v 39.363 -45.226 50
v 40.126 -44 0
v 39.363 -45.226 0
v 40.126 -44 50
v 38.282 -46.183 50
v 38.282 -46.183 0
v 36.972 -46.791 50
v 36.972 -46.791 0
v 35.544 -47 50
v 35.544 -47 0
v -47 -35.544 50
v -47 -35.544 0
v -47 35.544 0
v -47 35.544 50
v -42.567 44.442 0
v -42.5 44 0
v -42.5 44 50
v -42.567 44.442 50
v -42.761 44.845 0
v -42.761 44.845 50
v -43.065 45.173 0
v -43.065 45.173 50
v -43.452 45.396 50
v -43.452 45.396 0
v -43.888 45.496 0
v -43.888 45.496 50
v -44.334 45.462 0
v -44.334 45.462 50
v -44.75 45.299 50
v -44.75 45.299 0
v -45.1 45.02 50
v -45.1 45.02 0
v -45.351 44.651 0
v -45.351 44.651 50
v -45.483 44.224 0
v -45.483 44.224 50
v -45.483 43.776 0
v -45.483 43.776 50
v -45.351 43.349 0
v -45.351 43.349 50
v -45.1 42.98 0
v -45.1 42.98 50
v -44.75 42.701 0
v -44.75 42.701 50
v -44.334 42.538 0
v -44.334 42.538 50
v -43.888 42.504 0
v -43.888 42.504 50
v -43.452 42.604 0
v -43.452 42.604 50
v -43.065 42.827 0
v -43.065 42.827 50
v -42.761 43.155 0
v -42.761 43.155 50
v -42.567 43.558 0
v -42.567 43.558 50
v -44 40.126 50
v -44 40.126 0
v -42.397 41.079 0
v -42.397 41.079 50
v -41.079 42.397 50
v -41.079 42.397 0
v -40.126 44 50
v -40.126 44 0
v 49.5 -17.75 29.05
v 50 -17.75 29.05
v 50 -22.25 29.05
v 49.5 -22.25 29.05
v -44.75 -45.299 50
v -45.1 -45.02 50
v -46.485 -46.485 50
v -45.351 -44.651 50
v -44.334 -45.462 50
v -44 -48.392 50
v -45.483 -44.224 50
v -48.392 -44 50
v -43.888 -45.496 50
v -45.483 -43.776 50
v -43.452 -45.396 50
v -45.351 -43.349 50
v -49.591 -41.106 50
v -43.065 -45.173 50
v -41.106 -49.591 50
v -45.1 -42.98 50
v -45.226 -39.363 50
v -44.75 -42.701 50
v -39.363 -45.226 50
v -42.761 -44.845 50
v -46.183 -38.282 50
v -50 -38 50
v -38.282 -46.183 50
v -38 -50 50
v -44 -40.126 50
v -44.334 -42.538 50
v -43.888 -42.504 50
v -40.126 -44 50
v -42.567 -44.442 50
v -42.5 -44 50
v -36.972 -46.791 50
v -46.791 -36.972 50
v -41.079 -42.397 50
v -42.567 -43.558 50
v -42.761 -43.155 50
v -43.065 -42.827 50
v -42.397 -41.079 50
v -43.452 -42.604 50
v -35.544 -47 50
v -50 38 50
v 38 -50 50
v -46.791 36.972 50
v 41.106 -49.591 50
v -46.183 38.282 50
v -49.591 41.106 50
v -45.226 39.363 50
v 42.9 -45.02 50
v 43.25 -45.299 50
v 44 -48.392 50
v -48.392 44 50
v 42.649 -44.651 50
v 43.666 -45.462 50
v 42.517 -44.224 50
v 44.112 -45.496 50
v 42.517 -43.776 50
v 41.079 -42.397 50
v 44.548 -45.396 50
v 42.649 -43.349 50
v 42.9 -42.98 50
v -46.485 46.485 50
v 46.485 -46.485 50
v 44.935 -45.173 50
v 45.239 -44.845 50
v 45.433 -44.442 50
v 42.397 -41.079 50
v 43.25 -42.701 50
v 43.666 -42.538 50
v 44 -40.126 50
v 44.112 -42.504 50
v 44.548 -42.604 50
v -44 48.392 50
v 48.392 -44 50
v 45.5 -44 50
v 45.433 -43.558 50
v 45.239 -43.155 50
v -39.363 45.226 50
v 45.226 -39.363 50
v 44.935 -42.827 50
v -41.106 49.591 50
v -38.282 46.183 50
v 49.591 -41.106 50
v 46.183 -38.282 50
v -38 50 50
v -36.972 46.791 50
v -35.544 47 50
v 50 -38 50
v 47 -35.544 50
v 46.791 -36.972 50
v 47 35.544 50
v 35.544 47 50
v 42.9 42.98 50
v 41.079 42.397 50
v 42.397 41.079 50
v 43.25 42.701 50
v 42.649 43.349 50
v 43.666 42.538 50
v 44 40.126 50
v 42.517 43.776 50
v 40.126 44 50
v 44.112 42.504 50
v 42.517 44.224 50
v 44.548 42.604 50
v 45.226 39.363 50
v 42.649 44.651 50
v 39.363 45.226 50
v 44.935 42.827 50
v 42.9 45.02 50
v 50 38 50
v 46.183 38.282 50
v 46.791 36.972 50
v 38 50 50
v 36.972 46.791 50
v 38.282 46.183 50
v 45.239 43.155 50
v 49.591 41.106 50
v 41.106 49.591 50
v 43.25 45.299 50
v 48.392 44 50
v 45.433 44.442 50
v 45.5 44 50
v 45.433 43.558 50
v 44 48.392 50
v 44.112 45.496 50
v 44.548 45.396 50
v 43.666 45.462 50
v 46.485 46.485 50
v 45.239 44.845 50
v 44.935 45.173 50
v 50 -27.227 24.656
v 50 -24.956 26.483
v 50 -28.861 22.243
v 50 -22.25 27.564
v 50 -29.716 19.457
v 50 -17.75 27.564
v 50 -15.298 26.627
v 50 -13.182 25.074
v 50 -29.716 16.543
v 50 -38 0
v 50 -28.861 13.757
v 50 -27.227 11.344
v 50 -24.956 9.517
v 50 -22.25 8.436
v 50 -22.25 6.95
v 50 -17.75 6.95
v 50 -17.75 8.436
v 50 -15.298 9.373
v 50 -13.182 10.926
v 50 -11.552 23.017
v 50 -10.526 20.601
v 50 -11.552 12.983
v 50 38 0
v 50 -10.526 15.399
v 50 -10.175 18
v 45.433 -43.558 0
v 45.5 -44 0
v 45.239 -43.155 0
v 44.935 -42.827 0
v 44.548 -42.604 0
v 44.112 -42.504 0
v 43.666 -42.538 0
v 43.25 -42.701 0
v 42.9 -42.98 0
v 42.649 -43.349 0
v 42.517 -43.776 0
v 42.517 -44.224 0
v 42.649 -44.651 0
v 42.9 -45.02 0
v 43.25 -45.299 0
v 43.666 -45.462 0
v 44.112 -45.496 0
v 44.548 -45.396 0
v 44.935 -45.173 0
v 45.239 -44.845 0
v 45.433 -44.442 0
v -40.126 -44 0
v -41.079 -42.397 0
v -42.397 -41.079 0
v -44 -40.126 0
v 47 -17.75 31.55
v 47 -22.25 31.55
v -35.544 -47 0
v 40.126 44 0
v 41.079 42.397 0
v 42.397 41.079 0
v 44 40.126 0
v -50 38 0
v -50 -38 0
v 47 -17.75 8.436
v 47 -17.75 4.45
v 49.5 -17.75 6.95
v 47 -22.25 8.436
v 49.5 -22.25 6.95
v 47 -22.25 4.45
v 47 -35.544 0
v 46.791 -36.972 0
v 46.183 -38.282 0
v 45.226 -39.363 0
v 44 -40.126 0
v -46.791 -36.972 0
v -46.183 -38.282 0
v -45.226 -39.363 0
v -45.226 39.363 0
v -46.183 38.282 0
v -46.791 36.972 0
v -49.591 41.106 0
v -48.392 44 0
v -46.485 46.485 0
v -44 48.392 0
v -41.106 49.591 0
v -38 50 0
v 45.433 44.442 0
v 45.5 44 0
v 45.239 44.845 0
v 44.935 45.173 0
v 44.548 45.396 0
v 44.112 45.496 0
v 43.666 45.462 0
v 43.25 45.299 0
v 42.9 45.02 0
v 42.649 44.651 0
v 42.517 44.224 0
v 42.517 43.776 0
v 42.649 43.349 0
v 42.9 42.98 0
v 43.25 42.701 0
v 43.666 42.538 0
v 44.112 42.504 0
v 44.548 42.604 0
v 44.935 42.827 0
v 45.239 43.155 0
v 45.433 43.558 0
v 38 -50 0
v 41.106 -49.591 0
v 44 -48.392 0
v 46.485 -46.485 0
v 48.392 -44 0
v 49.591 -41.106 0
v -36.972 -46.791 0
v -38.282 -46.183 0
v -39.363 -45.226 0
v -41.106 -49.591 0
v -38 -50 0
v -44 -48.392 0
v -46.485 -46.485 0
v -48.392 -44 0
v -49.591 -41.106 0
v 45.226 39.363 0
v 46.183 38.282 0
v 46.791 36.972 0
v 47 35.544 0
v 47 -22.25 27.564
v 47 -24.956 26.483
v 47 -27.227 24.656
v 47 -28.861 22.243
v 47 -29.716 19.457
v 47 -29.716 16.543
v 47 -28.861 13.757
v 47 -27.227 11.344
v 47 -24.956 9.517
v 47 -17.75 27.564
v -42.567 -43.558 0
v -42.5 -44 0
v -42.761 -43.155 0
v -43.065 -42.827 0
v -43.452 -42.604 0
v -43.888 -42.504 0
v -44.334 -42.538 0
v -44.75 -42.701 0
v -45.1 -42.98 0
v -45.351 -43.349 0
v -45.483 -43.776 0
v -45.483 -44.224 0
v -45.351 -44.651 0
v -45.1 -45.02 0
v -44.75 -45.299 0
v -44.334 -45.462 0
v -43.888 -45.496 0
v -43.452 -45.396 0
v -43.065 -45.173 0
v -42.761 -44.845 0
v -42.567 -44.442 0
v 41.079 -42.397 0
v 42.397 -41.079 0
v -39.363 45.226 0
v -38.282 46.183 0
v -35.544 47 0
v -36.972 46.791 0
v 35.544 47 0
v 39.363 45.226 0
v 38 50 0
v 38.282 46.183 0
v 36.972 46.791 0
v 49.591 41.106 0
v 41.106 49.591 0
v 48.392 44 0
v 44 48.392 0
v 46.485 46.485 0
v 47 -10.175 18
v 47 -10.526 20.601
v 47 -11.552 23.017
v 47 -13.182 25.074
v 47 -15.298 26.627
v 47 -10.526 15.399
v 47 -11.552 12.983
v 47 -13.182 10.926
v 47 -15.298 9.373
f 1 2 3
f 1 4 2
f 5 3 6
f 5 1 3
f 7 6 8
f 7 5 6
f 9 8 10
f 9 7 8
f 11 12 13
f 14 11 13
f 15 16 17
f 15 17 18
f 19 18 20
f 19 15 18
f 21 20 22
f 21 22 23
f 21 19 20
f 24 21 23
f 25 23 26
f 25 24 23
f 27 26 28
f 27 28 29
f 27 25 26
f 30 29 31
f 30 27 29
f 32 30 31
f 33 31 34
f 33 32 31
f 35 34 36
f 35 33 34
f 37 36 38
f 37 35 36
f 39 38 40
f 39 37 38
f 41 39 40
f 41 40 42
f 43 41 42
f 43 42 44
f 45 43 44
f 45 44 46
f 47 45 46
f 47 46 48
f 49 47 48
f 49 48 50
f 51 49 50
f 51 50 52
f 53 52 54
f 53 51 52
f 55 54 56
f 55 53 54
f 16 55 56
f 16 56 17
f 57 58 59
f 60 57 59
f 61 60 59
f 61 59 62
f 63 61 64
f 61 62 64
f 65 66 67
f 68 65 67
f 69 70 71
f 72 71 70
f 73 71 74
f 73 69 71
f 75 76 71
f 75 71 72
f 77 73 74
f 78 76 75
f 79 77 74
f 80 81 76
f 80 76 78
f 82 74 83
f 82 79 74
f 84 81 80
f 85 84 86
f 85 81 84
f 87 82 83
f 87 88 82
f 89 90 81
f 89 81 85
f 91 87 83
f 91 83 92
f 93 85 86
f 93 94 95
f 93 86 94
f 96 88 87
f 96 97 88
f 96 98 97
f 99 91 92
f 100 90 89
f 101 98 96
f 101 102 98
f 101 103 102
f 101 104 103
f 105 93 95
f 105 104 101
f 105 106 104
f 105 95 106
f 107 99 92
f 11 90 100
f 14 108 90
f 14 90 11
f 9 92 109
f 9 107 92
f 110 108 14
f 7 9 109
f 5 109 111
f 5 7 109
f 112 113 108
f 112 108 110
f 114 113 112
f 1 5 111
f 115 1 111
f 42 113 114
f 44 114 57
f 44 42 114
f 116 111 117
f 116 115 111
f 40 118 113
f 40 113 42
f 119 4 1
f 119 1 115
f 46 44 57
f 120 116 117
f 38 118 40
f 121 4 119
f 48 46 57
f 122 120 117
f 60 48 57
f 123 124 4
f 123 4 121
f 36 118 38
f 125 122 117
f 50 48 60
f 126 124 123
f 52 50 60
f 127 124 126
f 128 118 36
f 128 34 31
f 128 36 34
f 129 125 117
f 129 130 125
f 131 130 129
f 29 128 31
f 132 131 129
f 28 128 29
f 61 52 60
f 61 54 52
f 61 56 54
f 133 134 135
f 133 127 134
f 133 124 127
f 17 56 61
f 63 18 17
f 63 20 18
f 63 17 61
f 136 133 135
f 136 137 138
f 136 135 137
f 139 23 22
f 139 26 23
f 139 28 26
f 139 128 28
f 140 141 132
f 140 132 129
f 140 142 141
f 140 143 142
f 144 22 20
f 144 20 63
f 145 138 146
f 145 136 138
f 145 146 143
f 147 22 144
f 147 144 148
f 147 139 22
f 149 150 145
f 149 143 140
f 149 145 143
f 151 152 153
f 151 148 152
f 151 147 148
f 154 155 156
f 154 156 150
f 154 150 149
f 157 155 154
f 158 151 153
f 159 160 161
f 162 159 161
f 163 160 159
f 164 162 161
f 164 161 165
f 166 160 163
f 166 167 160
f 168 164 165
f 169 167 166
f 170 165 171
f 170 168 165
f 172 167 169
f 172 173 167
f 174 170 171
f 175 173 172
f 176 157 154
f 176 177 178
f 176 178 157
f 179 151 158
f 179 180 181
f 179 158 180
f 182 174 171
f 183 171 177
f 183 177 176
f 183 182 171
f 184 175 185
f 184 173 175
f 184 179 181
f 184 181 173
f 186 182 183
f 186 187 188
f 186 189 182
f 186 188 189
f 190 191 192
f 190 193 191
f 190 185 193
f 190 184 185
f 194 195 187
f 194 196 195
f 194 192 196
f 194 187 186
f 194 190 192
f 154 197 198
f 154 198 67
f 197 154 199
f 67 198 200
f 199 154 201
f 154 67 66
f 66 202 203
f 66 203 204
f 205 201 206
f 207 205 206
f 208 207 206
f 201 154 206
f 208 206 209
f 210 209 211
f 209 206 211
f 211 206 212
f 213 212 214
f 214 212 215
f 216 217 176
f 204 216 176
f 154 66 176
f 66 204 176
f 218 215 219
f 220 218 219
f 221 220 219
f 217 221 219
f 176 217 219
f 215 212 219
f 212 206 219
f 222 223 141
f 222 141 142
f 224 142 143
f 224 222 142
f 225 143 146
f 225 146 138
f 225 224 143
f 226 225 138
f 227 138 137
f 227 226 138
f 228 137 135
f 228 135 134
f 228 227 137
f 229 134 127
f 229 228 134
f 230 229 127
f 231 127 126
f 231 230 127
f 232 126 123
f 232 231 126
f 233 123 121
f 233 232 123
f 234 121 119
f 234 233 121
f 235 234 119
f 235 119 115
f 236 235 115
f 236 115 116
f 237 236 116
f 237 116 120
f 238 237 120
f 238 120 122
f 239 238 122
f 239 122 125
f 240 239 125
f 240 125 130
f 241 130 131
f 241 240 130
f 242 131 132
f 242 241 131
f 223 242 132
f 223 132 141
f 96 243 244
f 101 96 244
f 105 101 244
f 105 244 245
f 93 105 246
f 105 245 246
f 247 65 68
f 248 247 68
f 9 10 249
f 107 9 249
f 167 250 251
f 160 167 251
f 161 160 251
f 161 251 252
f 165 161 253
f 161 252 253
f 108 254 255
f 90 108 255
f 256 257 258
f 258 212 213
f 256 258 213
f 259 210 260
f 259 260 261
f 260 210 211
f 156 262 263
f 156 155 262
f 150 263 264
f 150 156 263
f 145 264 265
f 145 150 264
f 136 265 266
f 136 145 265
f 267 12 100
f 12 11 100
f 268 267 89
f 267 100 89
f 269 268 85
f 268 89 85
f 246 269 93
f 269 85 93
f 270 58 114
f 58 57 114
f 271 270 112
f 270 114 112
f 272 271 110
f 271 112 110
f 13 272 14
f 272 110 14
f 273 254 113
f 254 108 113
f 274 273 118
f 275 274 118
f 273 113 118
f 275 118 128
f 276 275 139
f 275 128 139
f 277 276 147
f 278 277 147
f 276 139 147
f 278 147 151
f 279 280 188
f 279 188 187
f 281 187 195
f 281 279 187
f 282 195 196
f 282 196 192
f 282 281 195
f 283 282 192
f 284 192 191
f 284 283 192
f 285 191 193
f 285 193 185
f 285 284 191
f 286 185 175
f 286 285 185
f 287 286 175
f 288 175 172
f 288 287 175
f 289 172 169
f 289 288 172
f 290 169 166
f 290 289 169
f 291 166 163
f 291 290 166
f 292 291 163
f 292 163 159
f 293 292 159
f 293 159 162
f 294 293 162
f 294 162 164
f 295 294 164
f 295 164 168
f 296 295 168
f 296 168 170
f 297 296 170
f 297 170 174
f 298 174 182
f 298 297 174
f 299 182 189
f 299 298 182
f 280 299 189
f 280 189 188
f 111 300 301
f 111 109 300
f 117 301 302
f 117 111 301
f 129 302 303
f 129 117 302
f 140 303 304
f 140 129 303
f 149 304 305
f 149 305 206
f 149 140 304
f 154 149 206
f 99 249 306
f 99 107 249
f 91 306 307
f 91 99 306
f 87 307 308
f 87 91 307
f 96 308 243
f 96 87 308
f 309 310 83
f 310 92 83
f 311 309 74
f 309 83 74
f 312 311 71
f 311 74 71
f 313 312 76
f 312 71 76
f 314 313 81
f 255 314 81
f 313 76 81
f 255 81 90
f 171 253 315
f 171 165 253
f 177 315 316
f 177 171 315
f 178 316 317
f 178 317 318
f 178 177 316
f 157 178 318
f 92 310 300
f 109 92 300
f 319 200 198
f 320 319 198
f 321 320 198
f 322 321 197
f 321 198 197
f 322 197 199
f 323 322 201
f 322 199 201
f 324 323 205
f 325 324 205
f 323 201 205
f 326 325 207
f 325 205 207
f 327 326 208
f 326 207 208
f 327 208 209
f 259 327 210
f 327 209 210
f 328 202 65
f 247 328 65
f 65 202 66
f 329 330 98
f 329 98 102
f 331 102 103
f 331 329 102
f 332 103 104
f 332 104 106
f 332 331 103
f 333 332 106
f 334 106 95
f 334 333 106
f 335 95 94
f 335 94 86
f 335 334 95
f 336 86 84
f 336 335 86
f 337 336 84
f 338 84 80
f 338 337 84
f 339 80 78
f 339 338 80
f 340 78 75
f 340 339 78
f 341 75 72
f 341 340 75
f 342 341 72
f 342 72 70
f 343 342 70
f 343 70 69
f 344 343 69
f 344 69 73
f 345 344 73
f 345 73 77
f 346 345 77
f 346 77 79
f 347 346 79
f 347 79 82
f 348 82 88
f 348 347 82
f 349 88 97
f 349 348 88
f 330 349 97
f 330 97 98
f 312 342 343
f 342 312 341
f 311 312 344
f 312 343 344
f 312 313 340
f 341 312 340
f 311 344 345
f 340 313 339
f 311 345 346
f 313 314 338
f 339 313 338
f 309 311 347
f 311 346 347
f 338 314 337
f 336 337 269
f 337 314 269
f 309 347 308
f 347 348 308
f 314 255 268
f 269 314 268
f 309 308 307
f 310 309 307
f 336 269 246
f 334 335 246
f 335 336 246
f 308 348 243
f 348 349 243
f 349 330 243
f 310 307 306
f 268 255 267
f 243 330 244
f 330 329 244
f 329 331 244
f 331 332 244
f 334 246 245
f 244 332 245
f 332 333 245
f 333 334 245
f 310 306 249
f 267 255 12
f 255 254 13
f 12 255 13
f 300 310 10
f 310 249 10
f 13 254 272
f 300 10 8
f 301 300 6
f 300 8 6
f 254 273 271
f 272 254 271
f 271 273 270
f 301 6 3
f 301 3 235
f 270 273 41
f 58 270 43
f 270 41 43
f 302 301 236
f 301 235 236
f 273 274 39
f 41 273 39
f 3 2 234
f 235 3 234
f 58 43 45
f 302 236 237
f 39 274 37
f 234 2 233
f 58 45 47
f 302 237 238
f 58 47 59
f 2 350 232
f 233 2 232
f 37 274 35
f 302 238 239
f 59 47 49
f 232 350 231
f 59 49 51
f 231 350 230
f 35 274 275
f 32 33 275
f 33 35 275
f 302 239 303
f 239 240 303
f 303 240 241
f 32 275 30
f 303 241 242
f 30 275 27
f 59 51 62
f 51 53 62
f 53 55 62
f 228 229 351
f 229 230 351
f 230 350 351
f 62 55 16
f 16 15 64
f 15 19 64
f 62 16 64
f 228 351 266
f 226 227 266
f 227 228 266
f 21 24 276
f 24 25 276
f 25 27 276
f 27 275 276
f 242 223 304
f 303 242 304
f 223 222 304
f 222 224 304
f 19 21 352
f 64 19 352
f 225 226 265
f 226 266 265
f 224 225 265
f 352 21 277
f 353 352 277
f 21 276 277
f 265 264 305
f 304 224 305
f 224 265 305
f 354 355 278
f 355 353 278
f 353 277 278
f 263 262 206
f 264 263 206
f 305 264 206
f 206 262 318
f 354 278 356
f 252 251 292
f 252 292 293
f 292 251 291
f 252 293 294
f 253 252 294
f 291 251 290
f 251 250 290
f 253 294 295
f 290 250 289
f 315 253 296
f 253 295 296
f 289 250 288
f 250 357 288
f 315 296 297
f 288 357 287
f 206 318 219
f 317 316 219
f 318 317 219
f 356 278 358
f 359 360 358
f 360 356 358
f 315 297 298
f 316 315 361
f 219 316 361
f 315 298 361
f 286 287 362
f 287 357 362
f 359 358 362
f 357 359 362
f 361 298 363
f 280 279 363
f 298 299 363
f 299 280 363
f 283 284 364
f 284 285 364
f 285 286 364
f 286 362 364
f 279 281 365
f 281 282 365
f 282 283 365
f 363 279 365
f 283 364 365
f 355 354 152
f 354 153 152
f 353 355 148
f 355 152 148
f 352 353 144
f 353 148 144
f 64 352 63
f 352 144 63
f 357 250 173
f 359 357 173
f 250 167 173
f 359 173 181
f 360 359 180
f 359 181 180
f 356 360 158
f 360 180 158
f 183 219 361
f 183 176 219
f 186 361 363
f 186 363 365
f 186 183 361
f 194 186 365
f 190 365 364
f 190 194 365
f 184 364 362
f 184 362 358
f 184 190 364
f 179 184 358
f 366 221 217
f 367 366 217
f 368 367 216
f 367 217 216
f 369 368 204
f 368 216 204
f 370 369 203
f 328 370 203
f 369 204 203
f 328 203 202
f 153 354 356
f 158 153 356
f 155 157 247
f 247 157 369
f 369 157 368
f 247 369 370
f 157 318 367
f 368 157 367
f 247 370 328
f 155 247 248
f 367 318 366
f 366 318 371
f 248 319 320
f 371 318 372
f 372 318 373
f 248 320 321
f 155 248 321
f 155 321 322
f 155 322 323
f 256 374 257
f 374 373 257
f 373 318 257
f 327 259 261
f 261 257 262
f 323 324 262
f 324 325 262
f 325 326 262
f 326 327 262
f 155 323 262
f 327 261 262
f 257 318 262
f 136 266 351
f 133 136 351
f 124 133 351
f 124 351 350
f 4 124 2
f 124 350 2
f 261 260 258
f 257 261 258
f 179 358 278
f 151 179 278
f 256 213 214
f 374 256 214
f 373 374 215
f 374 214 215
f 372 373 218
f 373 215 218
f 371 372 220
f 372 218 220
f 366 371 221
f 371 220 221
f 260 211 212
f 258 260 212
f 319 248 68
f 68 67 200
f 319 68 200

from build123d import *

# Parameters (mm, degrees)
F0_R     = 1.5
F1_DEPTH = 50
F2_R     = 12
F3_R     = 5
F5_DEPTH = 4
F6_SIZE  = 2.5


with BuildPart() as f1:
    # F0 (on Top) → F1 (new body)
    with BuildSketch(Plane.XY):
        with BuildLine():
            Line((-50, 40.1261364576), (-50, -40.1261364576))
            ThreePointArc((-50, -40.1261364576), (-48.5323223277, -39.658202653), (-47, -39.5))
            Line((-47, -39.5), (-47, 39.5))
            ThreePointArc((-47, 39.5), (-48.5323223277, 39.658202653), (-50, 40.1261364576))
        make_face()
        with BuildLine():
            Line((-50, -50), (-40.1261364576, -50))
            ThreePointArc((-40.1261364576, -50), (-39.658202653, -48.5323223277), (-39.5, -47))
            Line((-39.5, -47), (-47, -47))
            Line((-47, -47), (-47, -39.5))
            ThreePointArc((-47, -39.5), (-48.5323223277, -39.658202653), (-50, -40.1261364576))
            Line((-50, -40.1261364576), (-50, -50))
        make_face()
        with BuildLine():
            Line((-47, -47), (-39.5, -47))
            ThreePointArc((-39.5, -47), (-41.6966991411, -41.6966991411), (-47, -39.5))
            Line((-47, -39.5), (-47, -47))
        make_face()
        with Locations((-44, -44)):
            Circle(F0_R, mode=Mode.SUBTRACT)
        with BuildLine():
            Line((-40.1261364576, -50), (40.1261364576, -50))
            ThreePointArc((40.1261364576, -50), (39.658202653, -48.5323223277), (39.5, -47))
            Line((39.5, -47), (-39.5, -47))
            ThreePointArc((-39.5, -47), (-39.658202653, -48.5323223277), (-40.1261364576, -50))
        make_face()
        with BuildLine():
            Line((40.1261364576, -50), (50, -50))
            Line((50, -50), (50, -40.1261364576))
            ThreePointArc((50, -40.1261364576), (48.5323223277, -39.658202653), (47, -39.5))
            Line((47, -39.5), (47, -47))
            Line((47, -47), (39.5, -47))
            ThreePointArc((39.5, -47), (39.658202653, -48.5323223277), (40.1261364576, -50))
        make_face()
        with BuildLine():
            ThreePointArc((47, -39.5), (41.6966991411, -41.6966991411), (39.5, -47))
            Line((39.5, -47), (47, -47))
            Line((47, -47), (47, -39.5))
        make_face()
        with Locations((44, -44)):
            Circle(F0_R, mode=Mode.SUBTRACT)
        with BuildLine():
            ThreePointArc((47, -39.5), (48.5323223277, -39.658202653), (50, -40.1261364576))
            Line((50, -40.1261364576), (50, 40.1261364576))
            ThreePointArc((50, 40.1261364576), (48.5323223277, 39.658202653), (47, 39.5))
            Line((47, 39.5), (47, -39.5))
        make_face()
        with BuildLine():
            ThreePointArc((47, 39.5), (48.5323223277, 39.658202653), (50, 40.1261364576))
            Line((50, 40.1261364576), (50, 50))
            Line((50, 50), (40.1261364576, 50))
            ThreePointArc((40.1261364576, 50), (39.658202653, 48.5323223277), (39.5, 47))
            Line((39.5, 47), (47, 47))
            Line((47, 47), (47, 39.5))
        make_face()
        with BuildLine():
            ThreePointArc((39.5, 47), (41.6966991411, 41.6966991411), (47, 39.5))
            Line((47, 39.5), (47, 47))
            Line((47, 47), (39.5, 47))
        make_face()
        with Locations((44, 44)):
            Circle(F0_R, mode=Mode.SUBTRACT)
        with BuildLine():
            ThreePointArc((39.5, 47), (39.658202653, 48.5323223277), (40.1261364576, 50))
            Line((40.1261364576, 50), (-40.1261364576, 50))
            ThreePointArc((-40.1261364576, 50), (-39.658202653, 48.5323223277), (-39.5, 47))
            Line((-39.5, 47), (39.5, 47))
        make_face()
        with BuildLine():
            Line((-50, 50), (-50, 40.1261364576))
            ThreePointArc((-50, 40.1261364576), (-48.5323223277, 39.658202653), (-47, 39.5))
            Line((-47, 39.5), (-47, 47))
            Line((-47, 47), (-39.5, 47))
            ThreePointArc((-39.5, 47), (-39.658202653, 48.5323223277), (-40.1261364576, 50))
            Line((-40.1261364576, 50), (-50, 50))
        make_face()
        with BuildLine():
            Line((-47, 47), (-47, 39.5))
            ThreePointArc((-47, 39.5), (-41.6966991411, 41.6966991411), (-39.5, 47))
            Line((-39.5, 47), (-47, 47))
        make_face()
        with Locations((-44, 44)):
            Circle(F0_R, mode=Mode.SUBTRACT)
    extrude(amount=F1_DEPTH)

    # F2
    f2_edges = [f1.edges().sort_by_distance(p)[0] for p in [
        (-50, 50, 25),
        (50, 50, 25),
        (50, -50, 25),
        (-50, -50, 25),
    ]]
    fillet(f2_edges, radius=F2_R)

    # F3
    f3_edges = [f1.edges().sort_by_distance(p)[0] for p in [
        (-47, -39.5, 25),
        (-39.5, -47, 25),
        (39.5, -47, 25),
        (47, -39.5, 25),
        (39.5, 47, 25),
        (47, 39.5, 25),
        (-47, 39.5, 25),
        (-39.5, 47, 25),
    ]]
    fillet(f3_edges, radius=F3_R)

    # F4 (on face) → F5 (cut)
    with BuildSketch(Plane.YZ.offset(50)):
        with BuildLine():
            Line((-22.25, 8.4361030432), (-22.25, 27.5638969568))
            ThreePointArc((-22.25, 27.5638969568), (-29.825, 18), (-22.25, 8.4361030432))
        make_face()
        with BuildLine():
            Line((-17.75, 8.4361030432), (-17.75, 27.5638969568))
            ThreePointArc((-17.75, 27.5638969568), (-20, 27.825), (-22.25, 27.5638969568))
            Line((-22.25, 27.5638969568), (-22.25, 8.4361030432))
            ThreePointArc((-22.25, 8.4361030432), (-20, 8.175), (-17.75, 8.4361030432))
        make_face()
        with BuildLine():
            ThreePointArc((-17.75, 8.4361030432), (-12.2981536305, 11.8998206994), (-10.175, 18))
            ThreePointArc((-10.175, 18), (-12.2981536305, 24.1001793006), (-17.75, 27.5638969568))
            Line((-17.75, 27.5638969568), (-17.75, 8.4361030432))
        make_face()
        with BuildLine():
            ThreePointArc((-22.25, 27.5638969568), (-20, 27.825), (-17.75, 27.5638969568))
            Line((-17.75, 27.5638969568), (-17.75, 29.05))
            Line((-17.75, 29.05), (-22.25, 29.05))
            Line((-22.25, 29.05), (-22.25, 27.5638969568))
        make_face()
        with BuildLine():
            Line((-17.75, 6.95), (-17.75, 8.4361030432))
            ThreePointArc((-17.75, 8.4361030432), (-20, 8.175), (-22.25, 8.4361030432))
            Line((-22.25, 8.4361030432), (-22.25, 6.95))
            Line((-22.25, 6.95), (-17.75, 6.95))
        make_face()
    extrude(amount=-F5_DEPTH, mode=Mode.SUBTRACT)

    # F6
    f6_edges = [f1.edges().sort_by_distance(p)[0] for p in [
        (47, -20, 29.05),
        (47, -20, 6.95),
    ]]
    chamfer(f6_edges, length=F6_SIZE)


solid = f1.part
